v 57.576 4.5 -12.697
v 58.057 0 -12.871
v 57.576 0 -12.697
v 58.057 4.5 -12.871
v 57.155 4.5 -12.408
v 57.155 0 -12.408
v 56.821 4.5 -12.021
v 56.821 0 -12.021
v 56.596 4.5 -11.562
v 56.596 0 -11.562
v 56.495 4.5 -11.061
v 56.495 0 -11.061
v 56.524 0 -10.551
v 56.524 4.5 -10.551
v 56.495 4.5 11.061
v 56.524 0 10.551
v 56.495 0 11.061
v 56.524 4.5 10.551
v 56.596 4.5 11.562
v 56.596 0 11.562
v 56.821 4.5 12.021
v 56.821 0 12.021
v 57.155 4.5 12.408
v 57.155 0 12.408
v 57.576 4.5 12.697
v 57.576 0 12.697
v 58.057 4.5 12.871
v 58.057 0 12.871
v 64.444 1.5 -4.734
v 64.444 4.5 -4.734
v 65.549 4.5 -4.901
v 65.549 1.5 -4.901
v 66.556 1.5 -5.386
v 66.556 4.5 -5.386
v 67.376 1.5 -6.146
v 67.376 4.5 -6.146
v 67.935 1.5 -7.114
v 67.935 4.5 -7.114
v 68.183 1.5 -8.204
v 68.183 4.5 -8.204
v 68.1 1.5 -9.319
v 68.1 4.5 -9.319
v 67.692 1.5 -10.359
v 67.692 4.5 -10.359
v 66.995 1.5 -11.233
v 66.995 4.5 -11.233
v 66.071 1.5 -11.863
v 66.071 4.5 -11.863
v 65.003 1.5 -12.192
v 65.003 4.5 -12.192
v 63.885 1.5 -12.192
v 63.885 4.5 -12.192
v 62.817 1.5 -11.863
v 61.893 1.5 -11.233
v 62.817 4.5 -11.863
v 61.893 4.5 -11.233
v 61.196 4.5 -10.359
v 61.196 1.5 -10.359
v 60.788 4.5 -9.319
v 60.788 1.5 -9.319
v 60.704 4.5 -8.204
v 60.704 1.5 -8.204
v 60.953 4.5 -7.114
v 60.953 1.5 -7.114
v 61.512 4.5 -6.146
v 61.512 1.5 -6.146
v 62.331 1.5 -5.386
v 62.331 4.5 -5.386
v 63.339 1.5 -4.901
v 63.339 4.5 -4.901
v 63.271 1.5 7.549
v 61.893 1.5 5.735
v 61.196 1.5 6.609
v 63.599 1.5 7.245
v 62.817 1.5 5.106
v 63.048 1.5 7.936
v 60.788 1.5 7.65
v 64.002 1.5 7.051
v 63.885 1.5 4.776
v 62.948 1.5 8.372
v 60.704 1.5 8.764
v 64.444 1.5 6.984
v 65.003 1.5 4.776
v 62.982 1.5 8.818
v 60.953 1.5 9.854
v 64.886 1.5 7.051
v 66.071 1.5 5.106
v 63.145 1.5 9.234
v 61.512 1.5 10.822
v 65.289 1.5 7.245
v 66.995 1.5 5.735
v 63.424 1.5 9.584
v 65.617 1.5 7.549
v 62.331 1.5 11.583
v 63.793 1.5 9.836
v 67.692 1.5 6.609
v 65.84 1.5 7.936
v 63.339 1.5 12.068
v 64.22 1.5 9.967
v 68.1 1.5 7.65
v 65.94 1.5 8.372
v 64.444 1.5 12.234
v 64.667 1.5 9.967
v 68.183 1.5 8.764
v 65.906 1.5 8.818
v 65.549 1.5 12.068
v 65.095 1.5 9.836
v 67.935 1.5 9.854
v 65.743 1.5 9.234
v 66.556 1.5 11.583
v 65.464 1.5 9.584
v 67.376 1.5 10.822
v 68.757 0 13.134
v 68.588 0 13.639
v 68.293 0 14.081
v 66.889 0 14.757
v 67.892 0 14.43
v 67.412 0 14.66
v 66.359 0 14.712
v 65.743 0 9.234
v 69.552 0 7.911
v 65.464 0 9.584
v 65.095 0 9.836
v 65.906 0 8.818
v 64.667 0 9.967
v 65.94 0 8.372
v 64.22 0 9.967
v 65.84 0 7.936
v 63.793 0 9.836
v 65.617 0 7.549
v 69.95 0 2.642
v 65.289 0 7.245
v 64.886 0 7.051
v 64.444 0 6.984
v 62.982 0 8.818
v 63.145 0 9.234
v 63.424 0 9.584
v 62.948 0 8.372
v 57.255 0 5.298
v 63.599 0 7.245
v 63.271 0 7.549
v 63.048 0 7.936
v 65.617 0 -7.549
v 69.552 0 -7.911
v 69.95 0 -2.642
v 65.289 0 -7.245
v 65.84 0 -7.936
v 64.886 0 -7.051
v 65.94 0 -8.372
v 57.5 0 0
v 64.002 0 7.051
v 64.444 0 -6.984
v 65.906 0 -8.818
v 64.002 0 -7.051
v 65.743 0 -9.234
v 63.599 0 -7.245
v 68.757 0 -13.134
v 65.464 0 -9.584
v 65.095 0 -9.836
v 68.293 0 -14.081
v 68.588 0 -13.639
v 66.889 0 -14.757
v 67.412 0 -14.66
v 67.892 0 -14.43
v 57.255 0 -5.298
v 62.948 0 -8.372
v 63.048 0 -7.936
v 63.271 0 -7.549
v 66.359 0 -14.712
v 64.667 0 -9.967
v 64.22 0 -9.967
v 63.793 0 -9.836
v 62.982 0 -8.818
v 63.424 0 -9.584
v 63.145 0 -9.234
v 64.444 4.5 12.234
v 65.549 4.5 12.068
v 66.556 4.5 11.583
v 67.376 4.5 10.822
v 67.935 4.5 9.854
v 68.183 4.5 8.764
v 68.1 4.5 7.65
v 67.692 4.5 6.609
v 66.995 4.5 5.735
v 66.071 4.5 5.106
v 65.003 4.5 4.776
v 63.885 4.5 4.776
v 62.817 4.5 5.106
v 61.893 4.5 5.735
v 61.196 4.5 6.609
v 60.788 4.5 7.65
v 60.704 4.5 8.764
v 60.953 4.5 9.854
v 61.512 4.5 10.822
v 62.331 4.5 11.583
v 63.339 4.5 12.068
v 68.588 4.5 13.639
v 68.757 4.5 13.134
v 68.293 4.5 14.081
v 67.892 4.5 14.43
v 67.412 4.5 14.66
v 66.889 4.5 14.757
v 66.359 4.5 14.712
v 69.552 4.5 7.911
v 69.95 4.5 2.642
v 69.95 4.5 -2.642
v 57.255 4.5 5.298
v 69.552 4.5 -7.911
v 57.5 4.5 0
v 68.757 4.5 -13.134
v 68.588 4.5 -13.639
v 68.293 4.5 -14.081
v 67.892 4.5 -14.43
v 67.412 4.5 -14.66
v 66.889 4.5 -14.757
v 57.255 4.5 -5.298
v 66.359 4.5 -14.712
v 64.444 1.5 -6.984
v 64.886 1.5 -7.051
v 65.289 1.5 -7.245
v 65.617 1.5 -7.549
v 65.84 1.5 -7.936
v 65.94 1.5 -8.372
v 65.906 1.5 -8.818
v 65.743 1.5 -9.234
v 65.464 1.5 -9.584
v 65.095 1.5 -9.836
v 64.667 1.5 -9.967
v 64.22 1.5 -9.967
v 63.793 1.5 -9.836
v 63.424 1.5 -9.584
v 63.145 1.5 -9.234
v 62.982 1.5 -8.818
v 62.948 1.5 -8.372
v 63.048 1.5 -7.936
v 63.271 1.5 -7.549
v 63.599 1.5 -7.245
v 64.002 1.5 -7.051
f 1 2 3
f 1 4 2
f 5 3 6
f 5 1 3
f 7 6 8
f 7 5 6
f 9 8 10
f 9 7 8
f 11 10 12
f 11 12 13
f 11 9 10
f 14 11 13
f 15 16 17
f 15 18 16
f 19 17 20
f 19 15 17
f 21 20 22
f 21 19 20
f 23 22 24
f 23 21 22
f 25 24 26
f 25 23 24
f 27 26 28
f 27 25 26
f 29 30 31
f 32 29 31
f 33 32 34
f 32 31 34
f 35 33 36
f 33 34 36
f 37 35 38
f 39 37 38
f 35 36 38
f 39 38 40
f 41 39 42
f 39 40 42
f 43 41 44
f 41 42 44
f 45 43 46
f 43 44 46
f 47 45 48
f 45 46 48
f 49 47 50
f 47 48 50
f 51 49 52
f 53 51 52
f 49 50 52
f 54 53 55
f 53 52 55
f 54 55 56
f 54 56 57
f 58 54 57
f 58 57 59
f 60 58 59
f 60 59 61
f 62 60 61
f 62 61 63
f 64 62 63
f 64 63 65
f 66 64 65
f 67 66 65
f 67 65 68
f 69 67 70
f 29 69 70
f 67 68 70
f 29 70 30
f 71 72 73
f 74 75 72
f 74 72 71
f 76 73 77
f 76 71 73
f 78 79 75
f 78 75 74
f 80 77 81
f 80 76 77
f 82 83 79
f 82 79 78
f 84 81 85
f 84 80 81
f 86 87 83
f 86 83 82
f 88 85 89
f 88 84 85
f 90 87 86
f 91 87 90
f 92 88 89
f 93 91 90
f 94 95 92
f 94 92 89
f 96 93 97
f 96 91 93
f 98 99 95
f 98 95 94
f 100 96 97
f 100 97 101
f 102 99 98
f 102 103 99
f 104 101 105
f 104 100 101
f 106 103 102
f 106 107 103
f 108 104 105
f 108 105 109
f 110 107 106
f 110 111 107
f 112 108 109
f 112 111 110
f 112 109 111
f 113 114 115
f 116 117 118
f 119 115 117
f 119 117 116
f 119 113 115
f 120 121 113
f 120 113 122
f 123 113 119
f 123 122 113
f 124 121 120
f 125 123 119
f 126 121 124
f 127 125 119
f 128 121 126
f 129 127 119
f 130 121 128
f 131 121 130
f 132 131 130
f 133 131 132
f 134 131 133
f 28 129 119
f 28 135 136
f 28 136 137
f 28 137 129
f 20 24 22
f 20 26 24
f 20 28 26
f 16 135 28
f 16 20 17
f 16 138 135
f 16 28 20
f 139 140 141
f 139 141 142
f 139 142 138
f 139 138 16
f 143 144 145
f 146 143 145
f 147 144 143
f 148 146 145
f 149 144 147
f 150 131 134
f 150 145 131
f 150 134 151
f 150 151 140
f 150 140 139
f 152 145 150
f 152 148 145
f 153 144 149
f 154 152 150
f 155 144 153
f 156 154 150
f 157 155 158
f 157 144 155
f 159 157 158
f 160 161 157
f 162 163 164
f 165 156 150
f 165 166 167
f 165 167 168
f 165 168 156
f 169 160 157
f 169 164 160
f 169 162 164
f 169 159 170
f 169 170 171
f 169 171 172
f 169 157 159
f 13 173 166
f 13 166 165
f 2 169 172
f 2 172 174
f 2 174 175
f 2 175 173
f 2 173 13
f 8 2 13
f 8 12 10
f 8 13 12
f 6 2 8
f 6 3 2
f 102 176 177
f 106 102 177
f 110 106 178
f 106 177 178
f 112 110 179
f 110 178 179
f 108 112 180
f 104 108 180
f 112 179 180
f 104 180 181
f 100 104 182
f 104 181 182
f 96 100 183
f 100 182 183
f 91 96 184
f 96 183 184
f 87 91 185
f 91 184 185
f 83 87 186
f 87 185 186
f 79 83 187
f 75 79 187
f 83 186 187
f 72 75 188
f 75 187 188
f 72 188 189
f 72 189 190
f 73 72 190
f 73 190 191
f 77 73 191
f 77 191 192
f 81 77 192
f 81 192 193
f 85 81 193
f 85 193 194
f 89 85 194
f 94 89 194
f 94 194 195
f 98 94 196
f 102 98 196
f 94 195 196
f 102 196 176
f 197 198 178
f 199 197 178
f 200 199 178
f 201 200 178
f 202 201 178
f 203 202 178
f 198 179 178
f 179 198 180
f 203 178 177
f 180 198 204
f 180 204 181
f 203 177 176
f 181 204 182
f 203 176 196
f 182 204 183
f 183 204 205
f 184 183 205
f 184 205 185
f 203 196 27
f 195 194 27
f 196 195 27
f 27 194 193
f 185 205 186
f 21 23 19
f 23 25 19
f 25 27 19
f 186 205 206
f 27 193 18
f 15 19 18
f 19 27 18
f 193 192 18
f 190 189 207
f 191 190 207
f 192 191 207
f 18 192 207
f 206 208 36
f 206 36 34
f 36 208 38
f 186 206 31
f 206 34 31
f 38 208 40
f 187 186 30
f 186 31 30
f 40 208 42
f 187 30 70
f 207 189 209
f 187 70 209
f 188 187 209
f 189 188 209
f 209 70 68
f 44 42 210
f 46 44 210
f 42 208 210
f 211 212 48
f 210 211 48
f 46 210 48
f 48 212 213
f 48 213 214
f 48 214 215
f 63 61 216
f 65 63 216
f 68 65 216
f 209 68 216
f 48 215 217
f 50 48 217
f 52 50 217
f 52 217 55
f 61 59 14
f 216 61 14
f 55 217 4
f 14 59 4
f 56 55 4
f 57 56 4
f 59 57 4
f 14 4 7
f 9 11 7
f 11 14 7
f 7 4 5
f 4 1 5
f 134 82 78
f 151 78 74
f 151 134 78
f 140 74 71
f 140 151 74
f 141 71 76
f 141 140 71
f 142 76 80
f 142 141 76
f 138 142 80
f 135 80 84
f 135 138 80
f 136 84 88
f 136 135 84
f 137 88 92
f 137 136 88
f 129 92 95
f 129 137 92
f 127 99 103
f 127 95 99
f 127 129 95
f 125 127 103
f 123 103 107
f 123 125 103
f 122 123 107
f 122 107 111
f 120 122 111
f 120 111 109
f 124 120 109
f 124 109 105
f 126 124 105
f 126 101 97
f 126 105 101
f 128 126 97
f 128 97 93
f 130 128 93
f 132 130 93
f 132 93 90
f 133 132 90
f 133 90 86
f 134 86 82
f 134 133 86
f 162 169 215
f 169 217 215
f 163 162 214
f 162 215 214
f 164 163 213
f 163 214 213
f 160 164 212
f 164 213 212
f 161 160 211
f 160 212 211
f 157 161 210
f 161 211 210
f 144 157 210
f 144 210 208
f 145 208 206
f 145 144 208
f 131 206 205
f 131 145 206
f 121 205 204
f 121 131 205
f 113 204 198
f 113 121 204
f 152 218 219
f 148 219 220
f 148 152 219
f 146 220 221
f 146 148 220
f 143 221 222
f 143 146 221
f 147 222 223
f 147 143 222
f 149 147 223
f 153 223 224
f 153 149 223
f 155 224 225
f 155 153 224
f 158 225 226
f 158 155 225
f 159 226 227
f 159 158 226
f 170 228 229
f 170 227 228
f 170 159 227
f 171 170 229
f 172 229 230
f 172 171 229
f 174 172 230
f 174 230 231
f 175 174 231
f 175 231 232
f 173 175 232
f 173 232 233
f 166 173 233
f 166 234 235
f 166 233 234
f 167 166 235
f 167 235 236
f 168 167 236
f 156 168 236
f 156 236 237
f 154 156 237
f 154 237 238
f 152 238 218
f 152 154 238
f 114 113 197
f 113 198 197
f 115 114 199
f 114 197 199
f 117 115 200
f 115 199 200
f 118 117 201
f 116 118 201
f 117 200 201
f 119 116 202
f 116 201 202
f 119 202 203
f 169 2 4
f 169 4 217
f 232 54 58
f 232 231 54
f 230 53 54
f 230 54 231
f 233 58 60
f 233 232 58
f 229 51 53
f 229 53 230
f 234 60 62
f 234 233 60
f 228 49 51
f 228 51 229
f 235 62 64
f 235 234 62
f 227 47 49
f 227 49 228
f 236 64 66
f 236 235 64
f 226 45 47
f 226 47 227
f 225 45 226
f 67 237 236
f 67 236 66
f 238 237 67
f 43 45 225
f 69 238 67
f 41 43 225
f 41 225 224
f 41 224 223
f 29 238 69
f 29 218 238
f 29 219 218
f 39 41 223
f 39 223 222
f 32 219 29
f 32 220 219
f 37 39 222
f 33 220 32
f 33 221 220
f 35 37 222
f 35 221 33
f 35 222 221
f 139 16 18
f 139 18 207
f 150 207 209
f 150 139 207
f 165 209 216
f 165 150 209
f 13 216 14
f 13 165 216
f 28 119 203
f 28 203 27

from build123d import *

# Parameters (mm, degrees)
SKETCH_1_R          = 1.5
EXTRUDE_1_DEPTH     = 4.5
FILLET_1_R          = 2
SKETCH_2_R          = 3.75
CUT_EXTRUDE_1_DEPTH = 3


with BuildPart() as part:
    # ｽｹｯﾁ1 → ﾎﾞｽ - 押し出し1 (new body)
    with BuildSketch(Plane(origin=(0, 0, 0), x_dir=(1, 0, 0), z_dir=(0, 1, 0))):
        with BuildLine():
            Line((56.137020409, 12.445277801), (68.340720498, 15.150772976))
            ThreePointArc((68.340720498, 15.150772976), (70, 0), (68.340720498, -15.150772976))
            Line((68.340720498, -15.150772976), (56.137020409, -12.445277801))
            ThreePointArc((56.137020409, -12.445277801), (57.5, 0), (56.137020409, 12.445277801))
        make_face()
        with Locations(Location((64.443915989, 8.484202494, 0), (0, 0, 270))):
            Circle(SKETCH_1_R, mode=Mode.SUBTRACT)
        with Locations(Location((64.443915989, -8.484202494, 0), (0, 0, 90))):
            Circle(SKETCH_1_R, mode=Mode.SUBTRACT)
    extrude(amount=EXTRUDE_1_DEPTH)

    # ﾌｨﾚｯﾄ1
    fillet_1_edges = [part.edges().sort_by_distance(p)[0] for p in [
        (68.340720498, 2.25, 15.150772976),
        (56.137020409, 2.25, 12.445277801),
        (56.137020409, 2.25, -12.445277801),
        (68.340720498, 2.25, -15.150772976),
    ]]
    fillet(fillet_1_edges, radius=FILLET_1_R)

    # ｽｹｯﾁ2 → ｶｯﾄ - 押し出し1 (cut)
    with BuildSketch(Plane(origin=(0, 4.5, 0), x_dir=(1, 0, 0), z_dir=(0, 1, 0))):
        with Locations(Location((64.443915989, 8.484202494, 0), (0, 0, 270))):
            Circle(SKETCH_2_R)
        with Locations(Location((64.443915989, -8.484202494, 0), (0, 0, 270))):
            Circle(SKETCH_2_R)
    extrude(amount=-CUT_EXTRUDE_1_DEPTH, mode=Mode.SUBTRACT)


solid = part.part
